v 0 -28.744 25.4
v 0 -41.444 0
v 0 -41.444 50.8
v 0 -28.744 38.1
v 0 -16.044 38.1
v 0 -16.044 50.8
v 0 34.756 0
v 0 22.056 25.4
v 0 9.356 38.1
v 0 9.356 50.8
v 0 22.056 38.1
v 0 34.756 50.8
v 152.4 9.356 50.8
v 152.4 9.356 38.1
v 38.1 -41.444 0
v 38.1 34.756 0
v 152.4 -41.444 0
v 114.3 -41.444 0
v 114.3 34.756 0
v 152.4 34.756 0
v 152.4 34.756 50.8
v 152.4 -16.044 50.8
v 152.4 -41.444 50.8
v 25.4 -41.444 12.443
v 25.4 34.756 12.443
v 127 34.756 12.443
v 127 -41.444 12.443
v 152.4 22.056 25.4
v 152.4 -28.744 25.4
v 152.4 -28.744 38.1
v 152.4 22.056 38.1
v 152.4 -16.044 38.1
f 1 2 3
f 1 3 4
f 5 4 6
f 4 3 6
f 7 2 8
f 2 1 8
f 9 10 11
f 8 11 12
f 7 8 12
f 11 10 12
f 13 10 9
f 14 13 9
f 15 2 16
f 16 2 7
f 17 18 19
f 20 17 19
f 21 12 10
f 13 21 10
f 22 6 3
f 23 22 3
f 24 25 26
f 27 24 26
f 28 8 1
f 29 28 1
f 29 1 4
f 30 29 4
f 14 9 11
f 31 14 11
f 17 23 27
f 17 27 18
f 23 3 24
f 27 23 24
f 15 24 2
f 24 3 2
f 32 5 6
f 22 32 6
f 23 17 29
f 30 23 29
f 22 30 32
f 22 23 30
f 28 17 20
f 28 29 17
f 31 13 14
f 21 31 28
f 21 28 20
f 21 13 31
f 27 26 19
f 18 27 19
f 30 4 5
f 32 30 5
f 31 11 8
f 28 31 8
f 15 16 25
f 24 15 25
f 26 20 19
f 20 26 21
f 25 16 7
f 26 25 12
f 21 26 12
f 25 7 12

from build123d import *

# Parameters (mm, degrees)
F1_DEPTH = 152.4
F4_DEPTH = 76.2


with BuildPart() as f1:
    # F0 (on Right) → F1 (new body)
    with BuildSketch(Plane.YZ):
        Polygon((-41.44403, 50.8), (-41.44403, 0), (34.75597, 0), (34.75597, 50.8), (9.35597, 50.8), (9.35597, 38.1), (22.05597, 38.1), (22.05597, 25.4), (-28.74403, 25.4), (-28.74403, 38.1), (-16.04403, 38.1), (-16.04403, 50.8), align=None)
    extrude(amount=F1_DEPTH)

    # F3 (on face) → F4 (cut, through all)
    with BuildSketch(Plane(origin=(0, 34.75597, 0), x_dir=(-1, 0, 0), z_dir=(0, 1, 0))):
        Polygon((-127, 12.443408), (-114.3, 0), (-38.1, 0), (-25.4, 12.443408), align=None)
    extrude(amount=-F4_DEPTH, mode=Mode.SUBTRACT)


solid = f1.part
